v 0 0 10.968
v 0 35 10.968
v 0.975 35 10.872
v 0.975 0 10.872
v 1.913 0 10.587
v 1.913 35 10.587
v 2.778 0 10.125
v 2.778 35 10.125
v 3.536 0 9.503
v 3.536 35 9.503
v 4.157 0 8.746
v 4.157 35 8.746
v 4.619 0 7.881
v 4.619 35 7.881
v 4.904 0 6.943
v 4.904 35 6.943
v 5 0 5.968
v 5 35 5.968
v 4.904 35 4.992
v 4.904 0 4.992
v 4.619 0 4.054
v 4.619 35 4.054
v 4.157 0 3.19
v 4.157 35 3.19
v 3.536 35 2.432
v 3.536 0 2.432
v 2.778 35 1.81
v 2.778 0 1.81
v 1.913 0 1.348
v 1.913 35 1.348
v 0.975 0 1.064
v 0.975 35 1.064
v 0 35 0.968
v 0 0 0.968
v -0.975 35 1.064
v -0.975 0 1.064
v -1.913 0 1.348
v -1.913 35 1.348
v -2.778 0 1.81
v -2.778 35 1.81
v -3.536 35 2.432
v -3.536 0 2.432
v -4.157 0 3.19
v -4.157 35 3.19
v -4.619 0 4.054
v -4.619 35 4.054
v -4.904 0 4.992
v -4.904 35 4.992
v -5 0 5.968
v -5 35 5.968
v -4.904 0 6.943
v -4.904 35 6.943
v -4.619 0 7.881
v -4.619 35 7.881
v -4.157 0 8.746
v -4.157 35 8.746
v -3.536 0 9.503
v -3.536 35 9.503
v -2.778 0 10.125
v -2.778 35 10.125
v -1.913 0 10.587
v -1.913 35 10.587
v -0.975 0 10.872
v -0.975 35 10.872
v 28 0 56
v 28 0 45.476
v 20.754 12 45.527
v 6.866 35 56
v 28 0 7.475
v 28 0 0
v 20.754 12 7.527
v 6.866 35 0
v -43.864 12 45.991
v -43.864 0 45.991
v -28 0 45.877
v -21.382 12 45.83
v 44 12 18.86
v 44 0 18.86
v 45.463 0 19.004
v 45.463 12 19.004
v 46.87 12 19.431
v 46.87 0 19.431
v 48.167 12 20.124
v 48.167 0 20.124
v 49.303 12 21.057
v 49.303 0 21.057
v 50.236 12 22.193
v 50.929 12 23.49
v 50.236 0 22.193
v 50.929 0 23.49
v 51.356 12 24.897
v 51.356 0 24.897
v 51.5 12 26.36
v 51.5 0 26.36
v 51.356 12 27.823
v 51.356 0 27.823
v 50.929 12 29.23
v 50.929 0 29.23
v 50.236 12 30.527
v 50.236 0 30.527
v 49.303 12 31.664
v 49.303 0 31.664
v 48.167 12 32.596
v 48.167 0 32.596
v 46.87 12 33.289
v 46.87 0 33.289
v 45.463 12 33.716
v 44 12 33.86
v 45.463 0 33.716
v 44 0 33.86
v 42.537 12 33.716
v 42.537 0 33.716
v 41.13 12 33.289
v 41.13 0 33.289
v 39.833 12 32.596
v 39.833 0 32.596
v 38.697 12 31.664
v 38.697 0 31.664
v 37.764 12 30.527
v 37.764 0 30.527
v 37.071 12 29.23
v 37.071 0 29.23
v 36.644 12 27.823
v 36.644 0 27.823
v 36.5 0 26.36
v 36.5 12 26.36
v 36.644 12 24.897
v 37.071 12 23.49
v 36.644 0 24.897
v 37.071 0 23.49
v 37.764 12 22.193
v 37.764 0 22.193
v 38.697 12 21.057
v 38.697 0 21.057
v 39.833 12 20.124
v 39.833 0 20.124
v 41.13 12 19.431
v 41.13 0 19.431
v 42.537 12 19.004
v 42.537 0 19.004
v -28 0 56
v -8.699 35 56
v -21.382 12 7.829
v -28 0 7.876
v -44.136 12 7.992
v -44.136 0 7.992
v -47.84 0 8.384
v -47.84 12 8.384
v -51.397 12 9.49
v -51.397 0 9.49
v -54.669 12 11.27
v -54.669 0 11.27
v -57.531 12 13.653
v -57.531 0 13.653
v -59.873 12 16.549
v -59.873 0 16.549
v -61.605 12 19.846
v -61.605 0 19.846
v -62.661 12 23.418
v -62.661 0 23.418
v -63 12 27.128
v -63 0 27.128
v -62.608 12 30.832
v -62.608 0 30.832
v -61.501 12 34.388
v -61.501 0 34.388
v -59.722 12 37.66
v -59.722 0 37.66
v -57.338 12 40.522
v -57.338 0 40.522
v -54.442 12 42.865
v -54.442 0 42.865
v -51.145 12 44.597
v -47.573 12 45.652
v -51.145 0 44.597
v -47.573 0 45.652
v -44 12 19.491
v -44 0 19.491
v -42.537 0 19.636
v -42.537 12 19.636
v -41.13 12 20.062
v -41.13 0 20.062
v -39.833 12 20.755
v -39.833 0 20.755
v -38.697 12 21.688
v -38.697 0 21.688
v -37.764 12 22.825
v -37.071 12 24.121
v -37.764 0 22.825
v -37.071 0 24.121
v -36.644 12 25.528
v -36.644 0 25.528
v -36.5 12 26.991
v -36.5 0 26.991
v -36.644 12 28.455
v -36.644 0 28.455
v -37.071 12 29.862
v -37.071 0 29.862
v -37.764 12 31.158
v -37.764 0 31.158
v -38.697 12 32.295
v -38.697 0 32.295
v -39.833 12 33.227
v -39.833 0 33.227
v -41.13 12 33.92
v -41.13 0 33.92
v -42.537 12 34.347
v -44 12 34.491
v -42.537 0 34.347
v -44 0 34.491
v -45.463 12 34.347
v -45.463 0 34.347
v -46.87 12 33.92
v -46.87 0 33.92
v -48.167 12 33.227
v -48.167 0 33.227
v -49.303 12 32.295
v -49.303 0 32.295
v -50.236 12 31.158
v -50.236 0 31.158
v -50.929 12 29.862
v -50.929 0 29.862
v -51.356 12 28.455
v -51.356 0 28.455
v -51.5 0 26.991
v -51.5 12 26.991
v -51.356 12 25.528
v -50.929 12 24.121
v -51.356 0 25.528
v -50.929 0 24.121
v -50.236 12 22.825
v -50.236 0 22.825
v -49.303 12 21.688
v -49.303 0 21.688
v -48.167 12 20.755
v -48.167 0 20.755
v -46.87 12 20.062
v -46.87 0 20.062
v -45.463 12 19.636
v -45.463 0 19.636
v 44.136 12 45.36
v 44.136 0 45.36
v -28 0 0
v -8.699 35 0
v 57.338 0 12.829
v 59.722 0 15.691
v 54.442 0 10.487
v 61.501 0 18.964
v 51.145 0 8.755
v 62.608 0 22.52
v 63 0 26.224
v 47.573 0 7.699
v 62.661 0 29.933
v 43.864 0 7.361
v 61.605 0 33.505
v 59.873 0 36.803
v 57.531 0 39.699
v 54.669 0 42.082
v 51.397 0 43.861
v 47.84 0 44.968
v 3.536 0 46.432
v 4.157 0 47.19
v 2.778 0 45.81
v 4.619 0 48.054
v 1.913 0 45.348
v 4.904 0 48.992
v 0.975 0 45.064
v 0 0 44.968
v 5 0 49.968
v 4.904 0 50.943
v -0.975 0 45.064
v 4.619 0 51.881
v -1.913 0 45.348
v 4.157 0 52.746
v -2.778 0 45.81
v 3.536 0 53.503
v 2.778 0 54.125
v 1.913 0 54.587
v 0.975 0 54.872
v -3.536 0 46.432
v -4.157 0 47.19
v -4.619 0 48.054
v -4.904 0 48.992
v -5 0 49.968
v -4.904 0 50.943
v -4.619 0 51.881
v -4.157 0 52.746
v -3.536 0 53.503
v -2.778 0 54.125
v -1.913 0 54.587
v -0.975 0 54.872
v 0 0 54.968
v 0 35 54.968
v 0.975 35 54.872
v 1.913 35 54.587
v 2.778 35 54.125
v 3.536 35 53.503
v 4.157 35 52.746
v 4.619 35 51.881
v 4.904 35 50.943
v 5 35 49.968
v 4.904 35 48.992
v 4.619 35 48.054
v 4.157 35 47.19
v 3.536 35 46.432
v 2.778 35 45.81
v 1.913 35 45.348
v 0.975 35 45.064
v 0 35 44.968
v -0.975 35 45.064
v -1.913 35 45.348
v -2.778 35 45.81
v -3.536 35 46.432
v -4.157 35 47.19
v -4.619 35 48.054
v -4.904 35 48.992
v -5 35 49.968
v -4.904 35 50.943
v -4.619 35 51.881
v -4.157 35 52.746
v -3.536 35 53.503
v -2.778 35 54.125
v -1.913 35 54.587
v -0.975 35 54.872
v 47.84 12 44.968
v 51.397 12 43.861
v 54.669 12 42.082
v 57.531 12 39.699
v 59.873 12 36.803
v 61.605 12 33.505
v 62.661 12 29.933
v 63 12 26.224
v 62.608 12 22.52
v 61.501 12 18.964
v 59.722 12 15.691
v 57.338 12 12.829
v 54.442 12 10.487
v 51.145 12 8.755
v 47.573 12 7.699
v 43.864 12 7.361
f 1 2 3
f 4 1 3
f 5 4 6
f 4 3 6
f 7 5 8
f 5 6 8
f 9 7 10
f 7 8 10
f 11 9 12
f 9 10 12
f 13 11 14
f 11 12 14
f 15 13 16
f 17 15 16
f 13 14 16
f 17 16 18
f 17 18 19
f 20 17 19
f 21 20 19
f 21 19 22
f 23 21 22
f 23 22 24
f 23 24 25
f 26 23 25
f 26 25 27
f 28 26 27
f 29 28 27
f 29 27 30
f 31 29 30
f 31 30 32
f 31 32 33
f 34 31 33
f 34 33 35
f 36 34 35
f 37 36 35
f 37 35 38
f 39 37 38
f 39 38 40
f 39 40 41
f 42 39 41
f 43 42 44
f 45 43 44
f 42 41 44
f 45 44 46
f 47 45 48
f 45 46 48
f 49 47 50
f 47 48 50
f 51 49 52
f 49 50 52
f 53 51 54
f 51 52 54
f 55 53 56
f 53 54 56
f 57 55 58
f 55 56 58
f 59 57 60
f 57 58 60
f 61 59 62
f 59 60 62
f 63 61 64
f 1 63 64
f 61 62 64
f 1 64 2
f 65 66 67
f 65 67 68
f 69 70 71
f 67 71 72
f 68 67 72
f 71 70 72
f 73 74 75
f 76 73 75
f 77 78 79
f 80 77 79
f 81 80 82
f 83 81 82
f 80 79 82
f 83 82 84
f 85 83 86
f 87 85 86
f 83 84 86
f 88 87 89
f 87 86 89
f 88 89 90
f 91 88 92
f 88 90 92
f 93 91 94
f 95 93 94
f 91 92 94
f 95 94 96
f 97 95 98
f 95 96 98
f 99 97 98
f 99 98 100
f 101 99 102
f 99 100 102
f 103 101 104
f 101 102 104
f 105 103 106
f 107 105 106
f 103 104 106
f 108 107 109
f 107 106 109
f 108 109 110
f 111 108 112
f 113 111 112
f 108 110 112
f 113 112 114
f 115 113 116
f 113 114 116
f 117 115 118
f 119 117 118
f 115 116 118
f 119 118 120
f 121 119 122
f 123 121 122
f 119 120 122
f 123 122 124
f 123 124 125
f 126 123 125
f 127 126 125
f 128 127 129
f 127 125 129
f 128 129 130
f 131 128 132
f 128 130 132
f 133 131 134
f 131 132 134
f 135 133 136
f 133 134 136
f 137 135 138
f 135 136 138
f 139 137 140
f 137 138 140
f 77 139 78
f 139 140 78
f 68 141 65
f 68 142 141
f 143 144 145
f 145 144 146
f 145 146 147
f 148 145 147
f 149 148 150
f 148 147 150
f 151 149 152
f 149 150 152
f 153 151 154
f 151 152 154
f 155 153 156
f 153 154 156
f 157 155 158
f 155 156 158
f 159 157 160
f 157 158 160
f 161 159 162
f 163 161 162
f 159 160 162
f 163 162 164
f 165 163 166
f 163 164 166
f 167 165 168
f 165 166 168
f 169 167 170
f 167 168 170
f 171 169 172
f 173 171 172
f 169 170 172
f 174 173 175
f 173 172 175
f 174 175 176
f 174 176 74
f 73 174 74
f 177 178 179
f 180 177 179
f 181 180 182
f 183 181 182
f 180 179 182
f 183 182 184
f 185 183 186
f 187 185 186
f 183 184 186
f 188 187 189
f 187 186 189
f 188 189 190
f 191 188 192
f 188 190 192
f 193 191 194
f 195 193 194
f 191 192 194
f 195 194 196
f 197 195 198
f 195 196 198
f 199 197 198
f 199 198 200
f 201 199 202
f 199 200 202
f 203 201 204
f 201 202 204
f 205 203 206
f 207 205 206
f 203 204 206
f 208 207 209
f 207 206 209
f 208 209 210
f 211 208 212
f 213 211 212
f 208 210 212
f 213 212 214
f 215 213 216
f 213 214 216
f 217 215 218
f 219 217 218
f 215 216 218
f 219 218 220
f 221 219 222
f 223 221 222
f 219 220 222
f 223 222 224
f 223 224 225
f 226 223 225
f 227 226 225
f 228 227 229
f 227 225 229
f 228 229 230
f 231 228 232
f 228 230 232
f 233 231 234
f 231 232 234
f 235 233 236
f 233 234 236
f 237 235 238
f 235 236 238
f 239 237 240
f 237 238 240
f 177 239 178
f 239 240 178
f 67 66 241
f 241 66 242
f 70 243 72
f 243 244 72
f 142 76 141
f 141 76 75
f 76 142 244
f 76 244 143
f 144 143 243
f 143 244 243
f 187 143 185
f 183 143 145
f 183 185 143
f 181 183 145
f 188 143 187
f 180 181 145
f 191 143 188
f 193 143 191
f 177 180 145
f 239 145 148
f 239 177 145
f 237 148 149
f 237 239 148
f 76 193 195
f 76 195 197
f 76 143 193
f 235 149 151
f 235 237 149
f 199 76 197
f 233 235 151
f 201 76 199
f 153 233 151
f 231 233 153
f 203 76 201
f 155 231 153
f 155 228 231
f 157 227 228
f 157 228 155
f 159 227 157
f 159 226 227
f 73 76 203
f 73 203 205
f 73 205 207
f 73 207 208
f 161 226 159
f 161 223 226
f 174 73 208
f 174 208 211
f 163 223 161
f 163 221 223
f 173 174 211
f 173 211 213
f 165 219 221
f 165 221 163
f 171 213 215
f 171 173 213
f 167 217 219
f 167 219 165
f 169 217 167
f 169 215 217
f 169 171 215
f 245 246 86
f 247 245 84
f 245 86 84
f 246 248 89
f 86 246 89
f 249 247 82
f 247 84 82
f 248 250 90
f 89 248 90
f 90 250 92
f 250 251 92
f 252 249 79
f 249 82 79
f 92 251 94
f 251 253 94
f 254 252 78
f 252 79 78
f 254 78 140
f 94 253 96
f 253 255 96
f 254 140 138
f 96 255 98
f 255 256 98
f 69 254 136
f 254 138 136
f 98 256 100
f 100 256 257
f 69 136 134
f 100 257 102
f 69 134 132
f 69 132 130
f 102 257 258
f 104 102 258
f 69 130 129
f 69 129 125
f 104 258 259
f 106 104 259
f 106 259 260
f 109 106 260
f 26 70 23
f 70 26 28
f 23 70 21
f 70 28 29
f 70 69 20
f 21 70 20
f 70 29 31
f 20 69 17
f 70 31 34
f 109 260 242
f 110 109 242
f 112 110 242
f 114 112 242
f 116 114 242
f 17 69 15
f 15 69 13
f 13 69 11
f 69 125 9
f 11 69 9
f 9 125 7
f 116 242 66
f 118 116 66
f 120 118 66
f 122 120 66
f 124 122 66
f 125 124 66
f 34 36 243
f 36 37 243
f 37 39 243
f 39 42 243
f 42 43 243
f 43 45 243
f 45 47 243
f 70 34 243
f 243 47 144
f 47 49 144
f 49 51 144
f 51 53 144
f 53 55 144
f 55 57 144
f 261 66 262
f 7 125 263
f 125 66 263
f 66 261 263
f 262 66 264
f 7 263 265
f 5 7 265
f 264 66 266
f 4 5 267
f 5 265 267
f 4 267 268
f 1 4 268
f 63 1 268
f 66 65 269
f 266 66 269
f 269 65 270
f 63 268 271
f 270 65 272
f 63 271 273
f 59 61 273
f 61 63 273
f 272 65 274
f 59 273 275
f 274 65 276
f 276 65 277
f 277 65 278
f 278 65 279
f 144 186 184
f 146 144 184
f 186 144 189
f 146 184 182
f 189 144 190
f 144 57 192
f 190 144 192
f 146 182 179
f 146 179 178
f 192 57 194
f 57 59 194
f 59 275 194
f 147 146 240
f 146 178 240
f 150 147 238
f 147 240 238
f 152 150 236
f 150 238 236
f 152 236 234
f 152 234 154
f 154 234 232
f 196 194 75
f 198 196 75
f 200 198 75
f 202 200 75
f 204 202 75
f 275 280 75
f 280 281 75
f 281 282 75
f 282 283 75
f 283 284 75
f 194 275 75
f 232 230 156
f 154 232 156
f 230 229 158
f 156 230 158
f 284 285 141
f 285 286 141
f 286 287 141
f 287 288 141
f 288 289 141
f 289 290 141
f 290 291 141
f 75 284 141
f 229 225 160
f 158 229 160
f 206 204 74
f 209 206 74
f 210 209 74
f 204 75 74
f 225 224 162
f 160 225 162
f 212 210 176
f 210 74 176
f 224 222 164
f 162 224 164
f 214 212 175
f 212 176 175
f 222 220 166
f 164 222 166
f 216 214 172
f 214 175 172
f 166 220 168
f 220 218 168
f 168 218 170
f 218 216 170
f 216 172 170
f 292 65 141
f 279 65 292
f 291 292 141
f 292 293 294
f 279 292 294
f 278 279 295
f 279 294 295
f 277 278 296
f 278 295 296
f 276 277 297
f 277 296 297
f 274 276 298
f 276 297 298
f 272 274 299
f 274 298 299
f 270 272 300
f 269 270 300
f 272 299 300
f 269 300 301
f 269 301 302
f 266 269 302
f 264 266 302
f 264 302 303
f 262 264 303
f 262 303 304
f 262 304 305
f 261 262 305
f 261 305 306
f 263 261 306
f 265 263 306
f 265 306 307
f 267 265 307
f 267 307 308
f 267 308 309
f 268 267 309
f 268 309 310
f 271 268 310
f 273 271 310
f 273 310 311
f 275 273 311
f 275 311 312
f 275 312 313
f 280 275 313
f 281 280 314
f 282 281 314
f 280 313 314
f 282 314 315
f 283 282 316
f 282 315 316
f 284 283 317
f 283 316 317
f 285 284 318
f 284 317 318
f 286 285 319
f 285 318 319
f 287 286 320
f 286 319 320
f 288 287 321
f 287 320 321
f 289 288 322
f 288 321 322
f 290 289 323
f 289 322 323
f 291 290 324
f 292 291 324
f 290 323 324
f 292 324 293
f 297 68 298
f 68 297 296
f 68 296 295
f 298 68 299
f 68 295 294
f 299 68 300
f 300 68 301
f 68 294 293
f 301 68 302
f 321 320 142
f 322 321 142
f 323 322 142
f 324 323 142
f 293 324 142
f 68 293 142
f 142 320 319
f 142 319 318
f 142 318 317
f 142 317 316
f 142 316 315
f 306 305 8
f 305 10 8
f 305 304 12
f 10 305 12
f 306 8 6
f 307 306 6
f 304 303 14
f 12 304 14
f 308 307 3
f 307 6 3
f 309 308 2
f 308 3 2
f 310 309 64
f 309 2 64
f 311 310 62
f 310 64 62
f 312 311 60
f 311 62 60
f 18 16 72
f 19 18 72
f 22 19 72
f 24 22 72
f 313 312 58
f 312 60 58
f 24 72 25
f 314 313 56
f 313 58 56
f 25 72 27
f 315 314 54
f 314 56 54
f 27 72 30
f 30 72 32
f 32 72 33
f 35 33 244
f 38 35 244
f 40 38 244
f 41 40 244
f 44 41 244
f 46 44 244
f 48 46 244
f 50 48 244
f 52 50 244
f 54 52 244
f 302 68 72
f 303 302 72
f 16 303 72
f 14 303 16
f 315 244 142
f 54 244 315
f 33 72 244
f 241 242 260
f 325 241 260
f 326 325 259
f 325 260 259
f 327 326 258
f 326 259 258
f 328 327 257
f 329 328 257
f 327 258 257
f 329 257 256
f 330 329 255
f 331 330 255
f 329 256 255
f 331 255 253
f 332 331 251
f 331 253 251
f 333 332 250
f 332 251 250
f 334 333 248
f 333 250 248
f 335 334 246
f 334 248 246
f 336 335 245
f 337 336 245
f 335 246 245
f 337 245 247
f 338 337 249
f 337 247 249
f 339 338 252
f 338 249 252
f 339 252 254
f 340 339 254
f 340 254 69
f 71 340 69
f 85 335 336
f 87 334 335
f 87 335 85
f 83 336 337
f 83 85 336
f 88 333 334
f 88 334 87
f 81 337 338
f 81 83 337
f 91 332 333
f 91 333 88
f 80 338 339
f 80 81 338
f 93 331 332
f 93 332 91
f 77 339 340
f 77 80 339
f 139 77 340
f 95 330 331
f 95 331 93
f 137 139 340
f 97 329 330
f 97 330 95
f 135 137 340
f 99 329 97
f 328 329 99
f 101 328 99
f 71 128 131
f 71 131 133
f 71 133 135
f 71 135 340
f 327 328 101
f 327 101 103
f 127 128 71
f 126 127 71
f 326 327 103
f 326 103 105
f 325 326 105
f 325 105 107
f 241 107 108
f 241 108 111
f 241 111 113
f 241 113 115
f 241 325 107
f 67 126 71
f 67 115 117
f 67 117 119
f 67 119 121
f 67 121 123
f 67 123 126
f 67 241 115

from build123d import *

# Parameters (mm, degrees)
EXTRUDE_1_DEPTH     = 56
SKETCH_3_R          = 7.5
EXTRUDE_3_DEPTH     = 12
SKETCH_4_R          = 5
CUT_EXTRUDE_1_DEPTH = 92.268833673


with BuildPart() as part:
    # 스케치1 → 보스-돌출1 (new body)
    with BuildSketch(Plane.XY):
        Polygon((-28, 0), (28, 0), (6.865874615, 35), (-8.698826384, 35), align=None)
    extrude(amount=EXTRUDE_1_DEPTH)

    # 스케치3 → 보스-돌출3 (add)
    with BuildSketch(Plane.XZ):
        with BuildLine():
            Line((-43.863739751, 45.99090258), (44.136260249, 45.35978625))
            ThreePointArc((44.136260249, 45.35978625), (62.999511392, 26.224014609), (43.863739751, 7.360763465))
            Line((43.863739751, 7.360763465), (-44.136260249, 7.991879796))
            ThreePointArc((-44.136260249, 7.991879796), (-62.999511392, 27.127651437), (-43.863739751, 45.99090258))
        make_face()
        with Locations(Location((-44, 26.991391188, 0), (0, 0, 270))):
            Circle(SKETCH_3_R, mode=Mode.SUBTRACT)
        with Locations(Location((44, 26.360274858, 0), (0, 0, 270))):
            Circle(SKETCH_3_R, mode=Mode.SUBTRACT)
    extrude(amount=-EXTRUDE_3_DEPTH)

    # 스케치4 → 컷-돌출1 (cut, through all)
    with BuildSketch(Plane(origin=(0, 35, 0), x_dir=(1, 0, 0), z_dir=(0, 1, 0))):
        with Locations(Location((0, -5.967731641, 0), (0, 0, 270))):
            Circle(SKETCH_4_R)
        with Locations(Location((0, -49.967731641, 0), (0, 0, 270))):
            Circle(SKETCH_4_R)
    extrude(amount=-CUT_EXTRUDE_1_DEPTH, mode=Mode.SUBTRACT)


solid = part.part
